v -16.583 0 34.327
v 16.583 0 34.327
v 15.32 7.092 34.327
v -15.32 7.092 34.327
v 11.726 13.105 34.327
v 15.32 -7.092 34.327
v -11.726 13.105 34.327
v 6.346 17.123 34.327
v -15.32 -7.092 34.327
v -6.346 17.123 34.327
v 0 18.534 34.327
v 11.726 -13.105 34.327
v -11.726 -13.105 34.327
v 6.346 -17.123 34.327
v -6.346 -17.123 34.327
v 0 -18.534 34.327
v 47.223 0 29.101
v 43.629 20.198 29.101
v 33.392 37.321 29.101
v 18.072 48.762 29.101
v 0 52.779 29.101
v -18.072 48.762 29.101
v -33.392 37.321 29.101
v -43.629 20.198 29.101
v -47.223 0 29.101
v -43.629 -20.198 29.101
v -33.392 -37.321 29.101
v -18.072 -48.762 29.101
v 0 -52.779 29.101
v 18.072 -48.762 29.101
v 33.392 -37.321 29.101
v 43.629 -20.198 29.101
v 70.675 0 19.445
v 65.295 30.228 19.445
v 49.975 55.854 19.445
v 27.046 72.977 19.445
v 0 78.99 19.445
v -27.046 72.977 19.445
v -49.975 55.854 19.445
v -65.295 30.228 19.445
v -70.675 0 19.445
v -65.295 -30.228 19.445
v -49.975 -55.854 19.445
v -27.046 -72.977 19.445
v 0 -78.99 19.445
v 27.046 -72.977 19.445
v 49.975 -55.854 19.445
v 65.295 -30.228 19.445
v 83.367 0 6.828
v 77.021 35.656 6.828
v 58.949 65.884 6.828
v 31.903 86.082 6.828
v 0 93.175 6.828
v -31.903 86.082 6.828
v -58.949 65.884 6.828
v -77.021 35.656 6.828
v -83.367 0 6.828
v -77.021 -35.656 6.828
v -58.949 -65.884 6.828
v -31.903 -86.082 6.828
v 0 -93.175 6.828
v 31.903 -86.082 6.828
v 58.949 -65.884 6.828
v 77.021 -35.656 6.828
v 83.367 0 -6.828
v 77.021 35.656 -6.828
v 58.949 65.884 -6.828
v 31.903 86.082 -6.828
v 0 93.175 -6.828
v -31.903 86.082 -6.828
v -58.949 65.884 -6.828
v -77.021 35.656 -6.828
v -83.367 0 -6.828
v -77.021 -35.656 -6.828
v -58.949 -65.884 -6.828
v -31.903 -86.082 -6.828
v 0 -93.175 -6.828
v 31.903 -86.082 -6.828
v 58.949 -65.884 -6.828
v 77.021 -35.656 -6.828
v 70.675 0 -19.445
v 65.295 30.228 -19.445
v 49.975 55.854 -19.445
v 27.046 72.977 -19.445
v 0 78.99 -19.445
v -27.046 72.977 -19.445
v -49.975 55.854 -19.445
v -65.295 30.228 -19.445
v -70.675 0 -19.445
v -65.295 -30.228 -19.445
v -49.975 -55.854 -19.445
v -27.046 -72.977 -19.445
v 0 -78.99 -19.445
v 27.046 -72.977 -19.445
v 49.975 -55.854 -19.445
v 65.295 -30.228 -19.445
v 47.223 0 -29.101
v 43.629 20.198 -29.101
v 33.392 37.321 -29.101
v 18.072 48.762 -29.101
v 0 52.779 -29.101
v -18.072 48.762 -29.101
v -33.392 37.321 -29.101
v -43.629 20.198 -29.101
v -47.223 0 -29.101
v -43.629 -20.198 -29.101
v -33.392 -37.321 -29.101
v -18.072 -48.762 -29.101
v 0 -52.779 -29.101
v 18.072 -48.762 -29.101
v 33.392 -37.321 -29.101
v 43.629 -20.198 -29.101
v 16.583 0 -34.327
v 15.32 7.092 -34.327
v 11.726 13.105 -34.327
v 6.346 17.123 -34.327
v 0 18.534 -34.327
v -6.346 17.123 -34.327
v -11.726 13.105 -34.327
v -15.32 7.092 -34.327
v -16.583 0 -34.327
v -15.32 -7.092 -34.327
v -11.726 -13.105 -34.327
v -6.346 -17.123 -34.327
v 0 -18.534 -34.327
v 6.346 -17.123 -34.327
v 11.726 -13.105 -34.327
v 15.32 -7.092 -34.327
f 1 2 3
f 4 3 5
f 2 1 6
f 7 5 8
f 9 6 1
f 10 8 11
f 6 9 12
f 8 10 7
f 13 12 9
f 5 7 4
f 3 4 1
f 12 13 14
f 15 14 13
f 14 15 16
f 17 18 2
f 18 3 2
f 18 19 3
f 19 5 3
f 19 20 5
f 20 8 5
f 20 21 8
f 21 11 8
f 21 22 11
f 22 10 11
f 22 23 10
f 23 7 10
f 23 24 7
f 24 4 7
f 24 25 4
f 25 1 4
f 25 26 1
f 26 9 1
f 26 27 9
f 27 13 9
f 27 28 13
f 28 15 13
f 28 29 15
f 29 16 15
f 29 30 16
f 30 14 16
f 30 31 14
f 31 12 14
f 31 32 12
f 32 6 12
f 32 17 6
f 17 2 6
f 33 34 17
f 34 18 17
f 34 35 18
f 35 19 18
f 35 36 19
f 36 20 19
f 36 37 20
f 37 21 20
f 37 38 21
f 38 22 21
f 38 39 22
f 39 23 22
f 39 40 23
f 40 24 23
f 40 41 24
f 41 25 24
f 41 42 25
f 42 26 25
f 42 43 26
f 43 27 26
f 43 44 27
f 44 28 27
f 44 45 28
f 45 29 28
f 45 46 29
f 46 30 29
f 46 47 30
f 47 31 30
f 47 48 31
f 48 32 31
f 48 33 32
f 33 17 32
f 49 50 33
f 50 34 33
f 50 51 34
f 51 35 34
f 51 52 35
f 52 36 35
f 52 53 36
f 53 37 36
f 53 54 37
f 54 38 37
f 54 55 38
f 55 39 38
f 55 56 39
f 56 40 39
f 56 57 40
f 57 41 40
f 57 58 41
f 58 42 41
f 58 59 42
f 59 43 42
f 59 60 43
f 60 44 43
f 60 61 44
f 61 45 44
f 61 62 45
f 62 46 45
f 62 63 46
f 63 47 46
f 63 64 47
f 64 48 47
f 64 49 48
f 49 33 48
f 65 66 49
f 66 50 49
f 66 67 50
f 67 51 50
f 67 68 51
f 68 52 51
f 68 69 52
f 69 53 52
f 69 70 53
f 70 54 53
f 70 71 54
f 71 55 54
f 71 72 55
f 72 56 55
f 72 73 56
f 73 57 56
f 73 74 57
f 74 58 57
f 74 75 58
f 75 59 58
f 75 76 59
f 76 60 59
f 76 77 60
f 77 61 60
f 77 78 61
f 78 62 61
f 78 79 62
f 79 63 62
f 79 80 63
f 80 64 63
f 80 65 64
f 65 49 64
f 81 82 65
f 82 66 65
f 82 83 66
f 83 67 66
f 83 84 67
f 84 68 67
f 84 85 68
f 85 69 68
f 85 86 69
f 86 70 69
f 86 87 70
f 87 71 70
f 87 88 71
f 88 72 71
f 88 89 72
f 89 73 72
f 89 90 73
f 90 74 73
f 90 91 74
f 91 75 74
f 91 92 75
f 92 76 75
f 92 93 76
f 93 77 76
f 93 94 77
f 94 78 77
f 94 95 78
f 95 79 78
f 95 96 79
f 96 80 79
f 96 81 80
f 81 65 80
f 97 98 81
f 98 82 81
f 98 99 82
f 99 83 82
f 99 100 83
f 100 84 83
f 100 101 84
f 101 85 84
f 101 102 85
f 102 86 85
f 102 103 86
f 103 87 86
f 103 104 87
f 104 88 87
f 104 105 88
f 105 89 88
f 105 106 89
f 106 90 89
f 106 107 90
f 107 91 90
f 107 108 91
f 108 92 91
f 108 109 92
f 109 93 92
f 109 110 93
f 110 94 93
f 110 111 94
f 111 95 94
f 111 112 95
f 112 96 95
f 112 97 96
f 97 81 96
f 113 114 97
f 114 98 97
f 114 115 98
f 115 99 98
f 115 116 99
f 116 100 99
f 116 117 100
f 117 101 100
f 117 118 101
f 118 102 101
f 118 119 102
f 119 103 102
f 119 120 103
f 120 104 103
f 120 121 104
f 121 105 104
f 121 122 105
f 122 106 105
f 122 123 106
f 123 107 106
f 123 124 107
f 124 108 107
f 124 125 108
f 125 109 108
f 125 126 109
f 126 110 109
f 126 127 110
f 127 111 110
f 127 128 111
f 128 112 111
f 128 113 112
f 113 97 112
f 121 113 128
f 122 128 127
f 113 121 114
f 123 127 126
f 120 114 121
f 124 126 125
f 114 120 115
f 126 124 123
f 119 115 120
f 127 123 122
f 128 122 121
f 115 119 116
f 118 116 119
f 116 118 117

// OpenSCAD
// Generated by SolidPython 1.0.1 on 2020-07-29 00:46:53


scale(v = [17, 19, 7]) {
	sphere(r = 5);
}
/***********************************************
*********      SolidPython code:      **********
************************************************
 
# import packages: SolidPython
from solid import *
from solid.utils import *
from itertools import chain, combinations, permutations


class Resize:

    def __init__(self, scad_file):
        self.scad_file = scad_file
        #self.scad_file = import_scad(scad_file)
        # cone/cylinder param:
        self.r1 = 0
        self.r2 = 0
        self.h = 0
        # rectangular prism param:
        self.w = 0
        self.l = 0
        # ellipse param:
        self.r = 0

    # import OpenScad code (file name corresponds to shape)


    # classify shape + parameters
    def assign(self, param1, param2, param3):
        if self.scad_file == 'cone.scad':
            self.r1 = param1
            self.r2 = param2
            self.h = param3
        elif self.scad_file == 'cylinder.scad':
            self.r1 = param1
            self.r2 = param2
            self.h = param3
        elif self.scad_file == 'rectangularPrism.scad':
            self.h = param1
            self.l = param2
            self.w = param3
        else:
            self.r = param1
            self.h = param2

    # resize parameters
    def iterate(self):
        x = range(3, 20, 2)
        i = 1
        if self.scad_file == 'cone.scad':
            tempList = list(permutations(x, 2))
            for temp in tempList:
                param1 = temp[0]
                param2 = temp[1]
                filepath = 'produced_scad_files/' + 'cone' + str(param1) + '_' + str(param2) + '_' + '.scad'
                scad_render_to_file(cylinder(h=param1, r1=param2, r2=0), filepath)

        elif self.scad_file == 'cylinder.scad':
            tempList = list(permutations(x, 3))
            for temp in tempList:
                param1 = temp[0]
                param2 = temp[1]
                filepath = 'produced_scad_files/' + 'cylinder' + str(param1) + '_' + str(param2) + '_' + '.scad'
                scad_render_to_file(cylinder(h=param1, r1=param2, r2=param2), filepath)

        elif self.scad_file == 'rectangularPrism.scad':
            tempList = list(permutations(x, 3))
            for temp in tempList:
                param1 = temp[0]
                param2 = temp[1]
                param3 = temp[2]
                filepath = 'produced_scad_files/' + 'rectangularPrism' + str(param1) + '_' + str(param2) + '_' + str(
                    param3) + '.scad'
                scad_render_to_file(cube(size=(param1, param2, param3)), filepath)

        elif self.scad_file == 'ellipse.scad':
            tempList = list(permutations(x, 4))
            for temp in tempList:
                param1 = temp[0]
                param2 = temp[1]
                param3 = temp[2]
                param4 = temp[3]
                filepath = 'produced_scad_files/' + 'ellipse' + str(param1) + '_' + str(param2) + '_' + str(param3) + '_' + str(param4) + '.scad'
                scad_render_to_file(scale([param1, param2, param3])(sphere(r=param4)), filepath)

    def render_to_scadfile(self):
        scad_render_to_file(scad, 'example.scad') 
 
************************************************/
